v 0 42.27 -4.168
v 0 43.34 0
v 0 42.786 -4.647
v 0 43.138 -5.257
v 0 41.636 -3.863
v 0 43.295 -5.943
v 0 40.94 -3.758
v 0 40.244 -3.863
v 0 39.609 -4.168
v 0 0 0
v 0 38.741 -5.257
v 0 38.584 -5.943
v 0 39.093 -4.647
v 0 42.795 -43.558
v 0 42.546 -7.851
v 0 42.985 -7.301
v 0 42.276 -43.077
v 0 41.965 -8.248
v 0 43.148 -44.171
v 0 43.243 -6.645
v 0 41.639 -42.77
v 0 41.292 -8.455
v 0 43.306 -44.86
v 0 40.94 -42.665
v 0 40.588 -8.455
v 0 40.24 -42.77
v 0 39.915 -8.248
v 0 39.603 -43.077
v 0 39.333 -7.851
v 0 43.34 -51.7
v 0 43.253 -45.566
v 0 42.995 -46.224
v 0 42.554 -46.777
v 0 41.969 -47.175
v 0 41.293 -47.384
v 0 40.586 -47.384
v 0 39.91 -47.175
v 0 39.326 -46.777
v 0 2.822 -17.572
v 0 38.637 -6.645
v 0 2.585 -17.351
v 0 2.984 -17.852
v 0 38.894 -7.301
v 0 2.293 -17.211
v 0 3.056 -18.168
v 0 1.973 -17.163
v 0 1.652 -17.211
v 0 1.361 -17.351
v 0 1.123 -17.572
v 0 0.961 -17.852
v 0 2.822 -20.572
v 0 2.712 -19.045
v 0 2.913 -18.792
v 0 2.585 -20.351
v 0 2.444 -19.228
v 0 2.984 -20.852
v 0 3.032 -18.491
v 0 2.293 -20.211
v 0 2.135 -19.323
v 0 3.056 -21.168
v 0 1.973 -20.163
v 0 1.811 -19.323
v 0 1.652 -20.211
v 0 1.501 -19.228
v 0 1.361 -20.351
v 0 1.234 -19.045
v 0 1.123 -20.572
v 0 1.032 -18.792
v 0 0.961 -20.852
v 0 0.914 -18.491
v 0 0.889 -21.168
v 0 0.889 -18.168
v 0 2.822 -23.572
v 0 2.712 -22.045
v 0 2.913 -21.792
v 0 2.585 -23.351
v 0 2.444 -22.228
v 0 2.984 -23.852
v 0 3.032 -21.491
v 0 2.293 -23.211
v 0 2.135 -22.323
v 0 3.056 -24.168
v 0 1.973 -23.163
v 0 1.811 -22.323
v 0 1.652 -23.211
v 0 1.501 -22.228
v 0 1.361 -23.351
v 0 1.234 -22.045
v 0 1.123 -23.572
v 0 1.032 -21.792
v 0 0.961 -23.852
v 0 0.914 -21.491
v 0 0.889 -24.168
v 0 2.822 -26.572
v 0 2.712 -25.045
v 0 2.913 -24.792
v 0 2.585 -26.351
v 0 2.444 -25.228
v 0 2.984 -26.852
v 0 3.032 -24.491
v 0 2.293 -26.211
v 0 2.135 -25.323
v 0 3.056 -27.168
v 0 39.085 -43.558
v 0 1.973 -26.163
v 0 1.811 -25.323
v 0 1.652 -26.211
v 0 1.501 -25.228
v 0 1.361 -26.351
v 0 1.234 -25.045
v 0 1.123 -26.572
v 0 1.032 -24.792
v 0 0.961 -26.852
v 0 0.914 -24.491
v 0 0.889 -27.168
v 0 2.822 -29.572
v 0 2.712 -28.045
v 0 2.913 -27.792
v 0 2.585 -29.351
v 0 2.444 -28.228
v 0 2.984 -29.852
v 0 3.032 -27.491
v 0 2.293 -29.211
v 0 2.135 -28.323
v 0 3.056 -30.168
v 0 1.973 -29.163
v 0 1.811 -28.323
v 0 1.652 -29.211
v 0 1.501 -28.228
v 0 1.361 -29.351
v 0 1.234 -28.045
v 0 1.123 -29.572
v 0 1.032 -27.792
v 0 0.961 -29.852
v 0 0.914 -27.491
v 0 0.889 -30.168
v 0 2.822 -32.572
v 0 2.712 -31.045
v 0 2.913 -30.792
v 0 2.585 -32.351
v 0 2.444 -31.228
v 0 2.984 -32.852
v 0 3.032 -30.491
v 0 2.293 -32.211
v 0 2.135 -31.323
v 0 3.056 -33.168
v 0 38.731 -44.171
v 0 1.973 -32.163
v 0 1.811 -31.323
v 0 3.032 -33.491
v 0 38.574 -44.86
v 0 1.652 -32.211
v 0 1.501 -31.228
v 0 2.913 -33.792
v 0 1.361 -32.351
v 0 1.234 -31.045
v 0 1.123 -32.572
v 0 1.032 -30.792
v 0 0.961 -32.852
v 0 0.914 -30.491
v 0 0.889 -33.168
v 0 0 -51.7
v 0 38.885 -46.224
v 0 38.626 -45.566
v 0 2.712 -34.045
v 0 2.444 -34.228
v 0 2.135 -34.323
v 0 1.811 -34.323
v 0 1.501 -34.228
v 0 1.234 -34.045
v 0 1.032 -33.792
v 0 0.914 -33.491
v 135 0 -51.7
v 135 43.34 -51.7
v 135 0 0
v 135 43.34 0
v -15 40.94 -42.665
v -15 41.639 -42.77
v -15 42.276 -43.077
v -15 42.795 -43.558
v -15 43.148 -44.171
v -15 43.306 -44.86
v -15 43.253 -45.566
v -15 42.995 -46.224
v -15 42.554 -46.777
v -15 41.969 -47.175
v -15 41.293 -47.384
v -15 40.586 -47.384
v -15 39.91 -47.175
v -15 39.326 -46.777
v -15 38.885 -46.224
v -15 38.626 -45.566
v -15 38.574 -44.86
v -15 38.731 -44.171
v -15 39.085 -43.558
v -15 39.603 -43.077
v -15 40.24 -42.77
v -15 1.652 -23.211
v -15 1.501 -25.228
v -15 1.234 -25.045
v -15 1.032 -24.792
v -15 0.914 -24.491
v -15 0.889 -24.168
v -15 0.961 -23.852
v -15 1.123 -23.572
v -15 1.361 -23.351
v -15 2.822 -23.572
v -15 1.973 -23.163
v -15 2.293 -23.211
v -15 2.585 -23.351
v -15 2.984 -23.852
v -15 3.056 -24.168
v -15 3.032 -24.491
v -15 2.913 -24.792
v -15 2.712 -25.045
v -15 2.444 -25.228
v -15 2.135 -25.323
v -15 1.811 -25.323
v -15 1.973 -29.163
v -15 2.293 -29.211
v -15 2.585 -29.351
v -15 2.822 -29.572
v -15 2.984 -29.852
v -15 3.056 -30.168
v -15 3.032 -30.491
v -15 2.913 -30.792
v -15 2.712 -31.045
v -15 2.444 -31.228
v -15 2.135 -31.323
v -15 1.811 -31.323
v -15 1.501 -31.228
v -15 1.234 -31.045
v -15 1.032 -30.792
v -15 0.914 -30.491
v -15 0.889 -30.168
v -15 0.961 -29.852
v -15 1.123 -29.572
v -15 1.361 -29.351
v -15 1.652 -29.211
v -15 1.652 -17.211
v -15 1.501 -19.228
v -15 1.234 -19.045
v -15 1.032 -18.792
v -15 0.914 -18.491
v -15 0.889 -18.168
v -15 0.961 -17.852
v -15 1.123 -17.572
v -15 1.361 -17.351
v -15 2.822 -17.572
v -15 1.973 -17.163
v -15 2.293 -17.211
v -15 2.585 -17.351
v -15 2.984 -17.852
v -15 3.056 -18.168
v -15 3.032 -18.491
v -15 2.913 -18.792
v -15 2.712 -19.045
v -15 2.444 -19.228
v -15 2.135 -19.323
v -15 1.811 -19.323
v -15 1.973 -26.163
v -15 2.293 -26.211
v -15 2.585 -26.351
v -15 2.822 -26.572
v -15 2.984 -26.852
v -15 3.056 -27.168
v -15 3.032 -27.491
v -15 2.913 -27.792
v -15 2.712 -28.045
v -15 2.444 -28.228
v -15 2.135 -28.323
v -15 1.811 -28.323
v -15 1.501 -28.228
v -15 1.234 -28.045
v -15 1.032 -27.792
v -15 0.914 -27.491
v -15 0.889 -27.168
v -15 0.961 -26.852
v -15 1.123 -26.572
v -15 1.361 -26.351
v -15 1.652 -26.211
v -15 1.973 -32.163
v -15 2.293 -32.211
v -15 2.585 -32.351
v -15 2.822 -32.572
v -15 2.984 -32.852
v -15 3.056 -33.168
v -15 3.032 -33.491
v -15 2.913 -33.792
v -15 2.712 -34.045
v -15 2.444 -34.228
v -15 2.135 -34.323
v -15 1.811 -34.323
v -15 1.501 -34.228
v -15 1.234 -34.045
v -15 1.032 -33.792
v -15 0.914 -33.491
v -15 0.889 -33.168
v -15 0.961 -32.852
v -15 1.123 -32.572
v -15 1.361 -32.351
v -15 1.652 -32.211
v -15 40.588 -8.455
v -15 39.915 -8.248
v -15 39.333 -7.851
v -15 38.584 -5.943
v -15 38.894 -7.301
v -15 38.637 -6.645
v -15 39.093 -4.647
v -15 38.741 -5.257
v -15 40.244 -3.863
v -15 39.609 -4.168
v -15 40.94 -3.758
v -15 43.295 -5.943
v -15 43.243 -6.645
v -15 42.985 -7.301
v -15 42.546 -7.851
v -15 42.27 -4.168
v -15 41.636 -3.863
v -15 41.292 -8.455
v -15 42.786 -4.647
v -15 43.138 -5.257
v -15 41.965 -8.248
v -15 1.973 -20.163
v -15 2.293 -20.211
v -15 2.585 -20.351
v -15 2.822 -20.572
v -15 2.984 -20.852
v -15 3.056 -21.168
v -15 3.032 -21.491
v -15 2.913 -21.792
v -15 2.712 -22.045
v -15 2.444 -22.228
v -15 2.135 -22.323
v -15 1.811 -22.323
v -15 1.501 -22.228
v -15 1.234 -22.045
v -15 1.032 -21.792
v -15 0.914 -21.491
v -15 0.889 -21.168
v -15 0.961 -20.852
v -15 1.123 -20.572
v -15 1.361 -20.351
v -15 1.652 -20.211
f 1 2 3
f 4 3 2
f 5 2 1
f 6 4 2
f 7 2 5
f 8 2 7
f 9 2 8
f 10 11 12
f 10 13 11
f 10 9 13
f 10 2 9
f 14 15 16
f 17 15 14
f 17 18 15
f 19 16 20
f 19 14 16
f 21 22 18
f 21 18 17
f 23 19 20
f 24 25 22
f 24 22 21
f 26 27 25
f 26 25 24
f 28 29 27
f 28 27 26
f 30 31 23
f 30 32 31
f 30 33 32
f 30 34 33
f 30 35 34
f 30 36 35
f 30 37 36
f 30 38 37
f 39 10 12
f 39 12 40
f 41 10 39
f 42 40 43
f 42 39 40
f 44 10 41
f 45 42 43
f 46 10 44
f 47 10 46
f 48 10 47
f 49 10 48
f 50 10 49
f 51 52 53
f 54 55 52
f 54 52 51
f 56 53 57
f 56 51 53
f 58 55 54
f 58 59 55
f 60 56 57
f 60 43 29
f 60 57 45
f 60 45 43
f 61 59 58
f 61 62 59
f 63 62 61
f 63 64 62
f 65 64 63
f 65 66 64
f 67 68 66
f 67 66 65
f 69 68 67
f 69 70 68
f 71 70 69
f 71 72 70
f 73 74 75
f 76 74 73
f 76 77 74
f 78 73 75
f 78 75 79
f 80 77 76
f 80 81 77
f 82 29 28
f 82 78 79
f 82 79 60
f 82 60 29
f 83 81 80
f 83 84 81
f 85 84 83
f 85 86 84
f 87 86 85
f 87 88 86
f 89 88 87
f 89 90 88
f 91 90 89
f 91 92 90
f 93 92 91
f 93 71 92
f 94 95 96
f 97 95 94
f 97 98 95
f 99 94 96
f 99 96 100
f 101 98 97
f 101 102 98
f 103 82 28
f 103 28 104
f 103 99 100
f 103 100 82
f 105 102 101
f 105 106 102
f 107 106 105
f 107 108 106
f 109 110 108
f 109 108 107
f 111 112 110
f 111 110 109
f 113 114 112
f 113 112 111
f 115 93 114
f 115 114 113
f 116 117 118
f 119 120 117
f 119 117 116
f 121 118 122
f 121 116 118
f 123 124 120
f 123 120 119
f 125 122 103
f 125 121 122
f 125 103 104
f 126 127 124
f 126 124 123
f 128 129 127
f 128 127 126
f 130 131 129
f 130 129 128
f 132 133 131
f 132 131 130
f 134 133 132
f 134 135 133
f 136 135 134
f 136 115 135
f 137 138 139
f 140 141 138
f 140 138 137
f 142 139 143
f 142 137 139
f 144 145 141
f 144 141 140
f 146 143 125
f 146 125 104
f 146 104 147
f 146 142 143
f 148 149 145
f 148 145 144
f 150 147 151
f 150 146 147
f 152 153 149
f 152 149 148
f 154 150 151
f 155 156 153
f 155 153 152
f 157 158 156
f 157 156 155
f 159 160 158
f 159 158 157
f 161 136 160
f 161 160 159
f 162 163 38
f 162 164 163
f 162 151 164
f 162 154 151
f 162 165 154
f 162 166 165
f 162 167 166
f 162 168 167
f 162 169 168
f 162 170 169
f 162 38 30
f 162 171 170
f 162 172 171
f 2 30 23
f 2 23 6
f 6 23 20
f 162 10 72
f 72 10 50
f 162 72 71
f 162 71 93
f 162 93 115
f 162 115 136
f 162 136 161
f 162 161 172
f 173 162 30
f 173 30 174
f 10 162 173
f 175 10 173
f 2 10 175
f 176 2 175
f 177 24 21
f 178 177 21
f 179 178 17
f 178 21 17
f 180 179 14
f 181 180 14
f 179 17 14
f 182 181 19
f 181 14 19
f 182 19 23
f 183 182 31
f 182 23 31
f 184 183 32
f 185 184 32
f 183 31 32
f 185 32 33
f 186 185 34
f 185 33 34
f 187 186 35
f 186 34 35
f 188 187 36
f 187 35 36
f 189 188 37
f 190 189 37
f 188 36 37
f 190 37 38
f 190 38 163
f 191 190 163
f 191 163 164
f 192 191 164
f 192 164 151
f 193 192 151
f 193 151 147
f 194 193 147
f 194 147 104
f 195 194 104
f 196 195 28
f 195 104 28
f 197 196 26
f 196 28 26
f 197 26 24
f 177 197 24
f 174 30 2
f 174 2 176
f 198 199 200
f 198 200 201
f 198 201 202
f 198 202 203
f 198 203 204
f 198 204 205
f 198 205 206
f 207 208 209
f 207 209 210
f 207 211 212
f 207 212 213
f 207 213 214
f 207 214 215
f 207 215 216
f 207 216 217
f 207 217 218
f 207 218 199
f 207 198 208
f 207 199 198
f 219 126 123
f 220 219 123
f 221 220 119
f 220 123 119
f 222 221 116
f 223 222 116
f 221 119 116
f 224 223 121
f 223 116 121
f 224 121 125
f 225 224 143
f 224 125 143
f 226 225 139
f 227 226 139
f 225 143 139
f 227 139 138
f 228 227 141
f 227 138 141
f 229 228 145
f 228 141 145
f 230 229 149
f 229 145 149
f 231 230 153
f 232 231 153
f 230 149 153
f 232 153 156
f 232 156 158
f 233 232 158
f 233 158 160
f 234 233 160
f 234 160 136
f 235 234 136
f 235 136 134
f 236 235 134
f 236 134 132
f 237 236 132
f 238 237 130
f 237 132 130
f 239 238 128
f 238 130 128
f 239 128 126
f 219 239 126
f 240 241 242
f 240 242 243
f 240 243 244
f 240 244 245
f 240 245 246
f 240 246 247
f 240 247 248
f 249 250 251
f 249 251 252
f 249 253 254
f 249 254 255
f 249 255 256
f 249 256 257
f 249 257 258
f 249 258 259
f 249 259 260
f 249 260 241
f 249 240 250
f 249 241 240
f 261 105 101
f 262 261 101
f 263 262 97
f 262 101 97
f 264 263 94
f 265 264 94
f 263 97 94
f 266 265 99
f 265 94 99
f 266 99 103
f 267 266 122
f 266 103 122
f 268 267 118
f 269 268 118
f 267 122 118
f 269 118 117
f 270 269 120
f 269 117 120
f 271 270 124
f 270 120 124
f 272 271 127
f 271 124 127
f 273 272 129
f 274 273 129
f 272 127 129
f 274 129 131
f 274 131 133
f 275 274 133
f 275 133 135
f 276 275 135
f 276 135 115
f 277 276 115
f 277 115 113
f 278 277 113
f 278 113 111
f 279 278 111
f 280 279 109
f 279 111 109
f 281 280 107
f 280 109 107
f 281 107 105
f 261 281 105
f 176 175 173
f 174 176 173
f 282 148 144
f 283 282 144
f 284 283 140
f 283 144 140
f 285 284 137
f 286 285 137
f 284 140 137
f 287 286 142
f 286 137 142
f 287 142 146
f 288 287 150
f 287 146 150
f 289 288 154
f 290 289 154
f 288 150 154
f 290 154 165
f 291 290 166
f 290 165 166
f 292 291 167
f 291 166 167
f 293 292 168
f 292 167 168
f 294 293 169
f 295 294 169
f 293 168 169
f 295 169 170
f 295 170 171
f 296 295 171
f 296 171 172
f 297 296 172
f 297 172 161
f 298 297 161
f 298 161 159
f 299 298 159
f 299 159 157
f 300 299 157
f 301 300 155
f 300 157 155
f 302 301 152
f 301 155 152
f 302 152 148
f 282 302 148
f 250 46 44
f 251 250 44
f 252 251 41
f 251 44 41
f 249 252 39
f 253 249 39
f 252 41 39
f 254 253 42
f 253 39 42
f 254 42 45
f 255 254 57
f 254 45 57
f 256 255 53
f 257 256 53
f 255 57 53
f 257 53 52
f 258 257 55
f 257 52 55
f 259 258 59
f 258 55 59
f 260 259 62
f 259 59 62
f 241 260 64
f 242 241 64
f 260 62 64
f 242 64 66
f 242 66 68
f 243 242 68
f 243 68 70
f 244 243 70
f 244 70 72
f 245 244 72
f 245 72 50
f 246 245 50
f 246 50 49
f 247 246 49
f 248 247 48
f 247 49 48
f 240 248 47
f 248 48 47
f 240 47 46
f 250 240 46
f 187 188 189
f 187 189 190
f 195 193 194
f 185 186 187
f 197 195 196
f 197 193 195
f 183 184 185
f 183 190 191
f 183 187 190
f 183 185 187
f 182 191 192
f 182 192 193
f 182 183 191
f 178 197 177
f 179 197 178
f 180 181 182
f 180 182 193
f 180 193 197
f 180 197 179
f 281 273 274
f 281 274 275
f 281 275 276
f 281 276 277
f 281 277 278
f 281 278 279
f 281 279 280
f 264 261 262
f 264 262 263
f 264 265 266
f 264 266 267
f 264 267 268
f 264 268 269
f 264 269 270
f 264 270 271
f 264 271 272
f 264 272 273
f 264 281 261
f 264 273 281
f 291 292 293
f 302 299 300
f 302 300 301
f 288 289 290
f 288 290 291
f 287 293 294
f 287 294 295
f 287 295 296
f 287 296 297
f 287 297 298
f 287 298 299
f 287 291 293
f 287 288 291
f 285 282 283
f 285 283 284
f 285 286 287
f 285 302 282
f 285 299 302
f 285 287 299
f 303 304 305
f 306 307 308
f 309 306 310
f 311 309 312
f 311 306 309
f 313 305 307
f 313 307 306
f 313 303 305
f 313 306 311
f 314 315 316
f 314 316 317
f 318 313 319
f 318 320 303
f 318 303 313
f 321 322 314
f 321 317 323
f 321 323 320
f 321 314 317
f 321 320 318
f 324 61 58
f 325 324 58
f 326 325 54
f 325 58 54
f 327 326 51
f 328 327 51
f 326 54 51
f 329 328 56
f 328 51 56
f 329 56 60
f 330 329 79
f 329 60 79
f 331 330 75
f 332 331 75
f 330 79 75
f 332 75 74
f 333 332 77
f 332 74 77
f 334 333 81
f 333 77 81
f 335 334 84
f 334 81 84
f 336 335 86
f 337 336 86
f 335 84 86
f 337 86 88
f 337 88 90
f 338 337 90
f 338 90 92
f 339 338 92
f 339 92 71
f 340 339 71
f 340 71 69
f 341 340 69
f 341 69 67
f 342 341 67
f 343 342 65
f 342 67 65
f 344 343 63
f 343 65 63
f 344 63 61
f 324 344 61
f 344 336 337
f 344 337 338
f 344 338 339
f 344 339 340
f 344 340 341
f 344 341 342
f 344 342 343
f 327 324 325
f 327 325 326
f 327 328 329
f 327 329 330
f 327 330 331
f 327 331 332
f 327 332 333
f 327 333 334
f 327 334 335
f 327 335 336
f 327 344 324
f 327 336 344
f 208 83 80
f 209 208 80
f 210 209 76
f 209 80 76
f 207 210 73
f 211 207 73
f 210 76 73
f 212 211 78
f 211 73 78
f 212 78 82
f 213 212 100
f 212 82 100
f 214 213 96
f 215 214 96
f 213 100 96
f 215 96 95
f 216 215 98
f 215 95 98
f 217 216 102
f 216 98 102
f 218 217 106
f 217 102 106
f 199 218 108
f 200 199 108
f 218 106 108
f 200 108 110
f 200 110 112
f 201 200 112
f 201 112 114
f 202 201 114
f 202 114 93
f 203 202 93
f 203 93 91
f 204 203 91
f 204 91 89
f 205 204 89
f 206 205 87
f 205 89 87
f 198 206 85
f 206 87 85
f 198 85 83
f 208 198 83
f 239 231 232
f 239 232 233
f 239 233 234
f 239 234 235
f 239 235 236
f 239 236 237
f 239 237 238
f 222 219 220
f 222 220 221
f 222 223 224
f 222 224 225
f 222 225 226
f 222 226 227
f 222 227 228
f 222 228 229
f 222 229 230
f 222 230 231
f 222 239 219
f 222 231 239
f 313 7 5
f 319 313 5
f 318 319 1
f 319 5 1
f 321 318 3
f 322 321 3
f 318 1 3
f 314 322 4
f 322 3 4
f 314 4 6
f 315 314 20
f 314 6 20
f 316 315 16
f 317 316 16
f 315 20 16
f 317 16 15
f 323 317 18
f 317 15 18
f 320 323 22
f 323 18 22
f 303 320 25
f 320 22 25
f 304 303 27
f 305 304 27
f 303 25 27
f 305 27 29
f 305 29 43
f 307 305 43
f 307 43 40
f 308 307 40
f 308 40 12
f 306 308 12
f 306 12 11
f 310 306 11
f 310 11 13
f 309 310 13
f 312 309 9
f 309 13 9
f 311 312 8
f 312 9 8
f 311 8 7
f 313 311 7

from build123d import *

# Parameters (mm, degrees)
SKETCH_1_W      = 135
SKETCH_1_H      = 51.7
EXTRUDE_1_DEPTH = 43.34
SKETCH_2_R      = 1.086280141
SKETCH_2_R_2    = 2.372753638
SKETCH_2_R_3    = 2.361962499
EXTRUDE_2_DEPTH = 15


with BuildPart() as part:
    # 草图1 → 凸台-拉伸1 (new body)
    with BuildSketch(Plane(origin=(0, 0, 0), x_dir=(1, 0, 0), z_dir=(0, 1, 0))):
        with Locations((67.5, 25.85)):
            Rectangle(SKETCH_1_W, SKETCH_1_H)
    extrude(amount=EXTRUDE_1_DEPTH)

    # 草图2 → 凸台-拉伸2 (add)
    with BuildSketch(Plane.ZY):
        with Locations((-33.248816044, 1.972664588)):
            Circle(SKETCH_2_R)
        with Locations((-45.037596274, 40.939762419)):
            Circle(SKETCH_2_R_2)
        with Locations((-6.119823883, 40.939762419)):
            Circle(SKETCH_2_R_3)
        with Locations((-30.248816044, 1.972664588)):
            Circle(SKETCH_2_R)
        with Locations((-27.248816044, 1.972664588)):
            Circle(SKETCH_2_R)
        with Locations((-24.248816044, 1.972664588)):
            Circle(SKETCH_2_R)
        with Locations((-21.248816044, 1.972664588)):
            Circle(SKETCH_2_R)
        with Locations((-18.248816044, 1.972664588)):
            Circle(SKETCH_2_R)
    extrude(amount=EXTRUDE_2_DEPTH)


solid = part.part
